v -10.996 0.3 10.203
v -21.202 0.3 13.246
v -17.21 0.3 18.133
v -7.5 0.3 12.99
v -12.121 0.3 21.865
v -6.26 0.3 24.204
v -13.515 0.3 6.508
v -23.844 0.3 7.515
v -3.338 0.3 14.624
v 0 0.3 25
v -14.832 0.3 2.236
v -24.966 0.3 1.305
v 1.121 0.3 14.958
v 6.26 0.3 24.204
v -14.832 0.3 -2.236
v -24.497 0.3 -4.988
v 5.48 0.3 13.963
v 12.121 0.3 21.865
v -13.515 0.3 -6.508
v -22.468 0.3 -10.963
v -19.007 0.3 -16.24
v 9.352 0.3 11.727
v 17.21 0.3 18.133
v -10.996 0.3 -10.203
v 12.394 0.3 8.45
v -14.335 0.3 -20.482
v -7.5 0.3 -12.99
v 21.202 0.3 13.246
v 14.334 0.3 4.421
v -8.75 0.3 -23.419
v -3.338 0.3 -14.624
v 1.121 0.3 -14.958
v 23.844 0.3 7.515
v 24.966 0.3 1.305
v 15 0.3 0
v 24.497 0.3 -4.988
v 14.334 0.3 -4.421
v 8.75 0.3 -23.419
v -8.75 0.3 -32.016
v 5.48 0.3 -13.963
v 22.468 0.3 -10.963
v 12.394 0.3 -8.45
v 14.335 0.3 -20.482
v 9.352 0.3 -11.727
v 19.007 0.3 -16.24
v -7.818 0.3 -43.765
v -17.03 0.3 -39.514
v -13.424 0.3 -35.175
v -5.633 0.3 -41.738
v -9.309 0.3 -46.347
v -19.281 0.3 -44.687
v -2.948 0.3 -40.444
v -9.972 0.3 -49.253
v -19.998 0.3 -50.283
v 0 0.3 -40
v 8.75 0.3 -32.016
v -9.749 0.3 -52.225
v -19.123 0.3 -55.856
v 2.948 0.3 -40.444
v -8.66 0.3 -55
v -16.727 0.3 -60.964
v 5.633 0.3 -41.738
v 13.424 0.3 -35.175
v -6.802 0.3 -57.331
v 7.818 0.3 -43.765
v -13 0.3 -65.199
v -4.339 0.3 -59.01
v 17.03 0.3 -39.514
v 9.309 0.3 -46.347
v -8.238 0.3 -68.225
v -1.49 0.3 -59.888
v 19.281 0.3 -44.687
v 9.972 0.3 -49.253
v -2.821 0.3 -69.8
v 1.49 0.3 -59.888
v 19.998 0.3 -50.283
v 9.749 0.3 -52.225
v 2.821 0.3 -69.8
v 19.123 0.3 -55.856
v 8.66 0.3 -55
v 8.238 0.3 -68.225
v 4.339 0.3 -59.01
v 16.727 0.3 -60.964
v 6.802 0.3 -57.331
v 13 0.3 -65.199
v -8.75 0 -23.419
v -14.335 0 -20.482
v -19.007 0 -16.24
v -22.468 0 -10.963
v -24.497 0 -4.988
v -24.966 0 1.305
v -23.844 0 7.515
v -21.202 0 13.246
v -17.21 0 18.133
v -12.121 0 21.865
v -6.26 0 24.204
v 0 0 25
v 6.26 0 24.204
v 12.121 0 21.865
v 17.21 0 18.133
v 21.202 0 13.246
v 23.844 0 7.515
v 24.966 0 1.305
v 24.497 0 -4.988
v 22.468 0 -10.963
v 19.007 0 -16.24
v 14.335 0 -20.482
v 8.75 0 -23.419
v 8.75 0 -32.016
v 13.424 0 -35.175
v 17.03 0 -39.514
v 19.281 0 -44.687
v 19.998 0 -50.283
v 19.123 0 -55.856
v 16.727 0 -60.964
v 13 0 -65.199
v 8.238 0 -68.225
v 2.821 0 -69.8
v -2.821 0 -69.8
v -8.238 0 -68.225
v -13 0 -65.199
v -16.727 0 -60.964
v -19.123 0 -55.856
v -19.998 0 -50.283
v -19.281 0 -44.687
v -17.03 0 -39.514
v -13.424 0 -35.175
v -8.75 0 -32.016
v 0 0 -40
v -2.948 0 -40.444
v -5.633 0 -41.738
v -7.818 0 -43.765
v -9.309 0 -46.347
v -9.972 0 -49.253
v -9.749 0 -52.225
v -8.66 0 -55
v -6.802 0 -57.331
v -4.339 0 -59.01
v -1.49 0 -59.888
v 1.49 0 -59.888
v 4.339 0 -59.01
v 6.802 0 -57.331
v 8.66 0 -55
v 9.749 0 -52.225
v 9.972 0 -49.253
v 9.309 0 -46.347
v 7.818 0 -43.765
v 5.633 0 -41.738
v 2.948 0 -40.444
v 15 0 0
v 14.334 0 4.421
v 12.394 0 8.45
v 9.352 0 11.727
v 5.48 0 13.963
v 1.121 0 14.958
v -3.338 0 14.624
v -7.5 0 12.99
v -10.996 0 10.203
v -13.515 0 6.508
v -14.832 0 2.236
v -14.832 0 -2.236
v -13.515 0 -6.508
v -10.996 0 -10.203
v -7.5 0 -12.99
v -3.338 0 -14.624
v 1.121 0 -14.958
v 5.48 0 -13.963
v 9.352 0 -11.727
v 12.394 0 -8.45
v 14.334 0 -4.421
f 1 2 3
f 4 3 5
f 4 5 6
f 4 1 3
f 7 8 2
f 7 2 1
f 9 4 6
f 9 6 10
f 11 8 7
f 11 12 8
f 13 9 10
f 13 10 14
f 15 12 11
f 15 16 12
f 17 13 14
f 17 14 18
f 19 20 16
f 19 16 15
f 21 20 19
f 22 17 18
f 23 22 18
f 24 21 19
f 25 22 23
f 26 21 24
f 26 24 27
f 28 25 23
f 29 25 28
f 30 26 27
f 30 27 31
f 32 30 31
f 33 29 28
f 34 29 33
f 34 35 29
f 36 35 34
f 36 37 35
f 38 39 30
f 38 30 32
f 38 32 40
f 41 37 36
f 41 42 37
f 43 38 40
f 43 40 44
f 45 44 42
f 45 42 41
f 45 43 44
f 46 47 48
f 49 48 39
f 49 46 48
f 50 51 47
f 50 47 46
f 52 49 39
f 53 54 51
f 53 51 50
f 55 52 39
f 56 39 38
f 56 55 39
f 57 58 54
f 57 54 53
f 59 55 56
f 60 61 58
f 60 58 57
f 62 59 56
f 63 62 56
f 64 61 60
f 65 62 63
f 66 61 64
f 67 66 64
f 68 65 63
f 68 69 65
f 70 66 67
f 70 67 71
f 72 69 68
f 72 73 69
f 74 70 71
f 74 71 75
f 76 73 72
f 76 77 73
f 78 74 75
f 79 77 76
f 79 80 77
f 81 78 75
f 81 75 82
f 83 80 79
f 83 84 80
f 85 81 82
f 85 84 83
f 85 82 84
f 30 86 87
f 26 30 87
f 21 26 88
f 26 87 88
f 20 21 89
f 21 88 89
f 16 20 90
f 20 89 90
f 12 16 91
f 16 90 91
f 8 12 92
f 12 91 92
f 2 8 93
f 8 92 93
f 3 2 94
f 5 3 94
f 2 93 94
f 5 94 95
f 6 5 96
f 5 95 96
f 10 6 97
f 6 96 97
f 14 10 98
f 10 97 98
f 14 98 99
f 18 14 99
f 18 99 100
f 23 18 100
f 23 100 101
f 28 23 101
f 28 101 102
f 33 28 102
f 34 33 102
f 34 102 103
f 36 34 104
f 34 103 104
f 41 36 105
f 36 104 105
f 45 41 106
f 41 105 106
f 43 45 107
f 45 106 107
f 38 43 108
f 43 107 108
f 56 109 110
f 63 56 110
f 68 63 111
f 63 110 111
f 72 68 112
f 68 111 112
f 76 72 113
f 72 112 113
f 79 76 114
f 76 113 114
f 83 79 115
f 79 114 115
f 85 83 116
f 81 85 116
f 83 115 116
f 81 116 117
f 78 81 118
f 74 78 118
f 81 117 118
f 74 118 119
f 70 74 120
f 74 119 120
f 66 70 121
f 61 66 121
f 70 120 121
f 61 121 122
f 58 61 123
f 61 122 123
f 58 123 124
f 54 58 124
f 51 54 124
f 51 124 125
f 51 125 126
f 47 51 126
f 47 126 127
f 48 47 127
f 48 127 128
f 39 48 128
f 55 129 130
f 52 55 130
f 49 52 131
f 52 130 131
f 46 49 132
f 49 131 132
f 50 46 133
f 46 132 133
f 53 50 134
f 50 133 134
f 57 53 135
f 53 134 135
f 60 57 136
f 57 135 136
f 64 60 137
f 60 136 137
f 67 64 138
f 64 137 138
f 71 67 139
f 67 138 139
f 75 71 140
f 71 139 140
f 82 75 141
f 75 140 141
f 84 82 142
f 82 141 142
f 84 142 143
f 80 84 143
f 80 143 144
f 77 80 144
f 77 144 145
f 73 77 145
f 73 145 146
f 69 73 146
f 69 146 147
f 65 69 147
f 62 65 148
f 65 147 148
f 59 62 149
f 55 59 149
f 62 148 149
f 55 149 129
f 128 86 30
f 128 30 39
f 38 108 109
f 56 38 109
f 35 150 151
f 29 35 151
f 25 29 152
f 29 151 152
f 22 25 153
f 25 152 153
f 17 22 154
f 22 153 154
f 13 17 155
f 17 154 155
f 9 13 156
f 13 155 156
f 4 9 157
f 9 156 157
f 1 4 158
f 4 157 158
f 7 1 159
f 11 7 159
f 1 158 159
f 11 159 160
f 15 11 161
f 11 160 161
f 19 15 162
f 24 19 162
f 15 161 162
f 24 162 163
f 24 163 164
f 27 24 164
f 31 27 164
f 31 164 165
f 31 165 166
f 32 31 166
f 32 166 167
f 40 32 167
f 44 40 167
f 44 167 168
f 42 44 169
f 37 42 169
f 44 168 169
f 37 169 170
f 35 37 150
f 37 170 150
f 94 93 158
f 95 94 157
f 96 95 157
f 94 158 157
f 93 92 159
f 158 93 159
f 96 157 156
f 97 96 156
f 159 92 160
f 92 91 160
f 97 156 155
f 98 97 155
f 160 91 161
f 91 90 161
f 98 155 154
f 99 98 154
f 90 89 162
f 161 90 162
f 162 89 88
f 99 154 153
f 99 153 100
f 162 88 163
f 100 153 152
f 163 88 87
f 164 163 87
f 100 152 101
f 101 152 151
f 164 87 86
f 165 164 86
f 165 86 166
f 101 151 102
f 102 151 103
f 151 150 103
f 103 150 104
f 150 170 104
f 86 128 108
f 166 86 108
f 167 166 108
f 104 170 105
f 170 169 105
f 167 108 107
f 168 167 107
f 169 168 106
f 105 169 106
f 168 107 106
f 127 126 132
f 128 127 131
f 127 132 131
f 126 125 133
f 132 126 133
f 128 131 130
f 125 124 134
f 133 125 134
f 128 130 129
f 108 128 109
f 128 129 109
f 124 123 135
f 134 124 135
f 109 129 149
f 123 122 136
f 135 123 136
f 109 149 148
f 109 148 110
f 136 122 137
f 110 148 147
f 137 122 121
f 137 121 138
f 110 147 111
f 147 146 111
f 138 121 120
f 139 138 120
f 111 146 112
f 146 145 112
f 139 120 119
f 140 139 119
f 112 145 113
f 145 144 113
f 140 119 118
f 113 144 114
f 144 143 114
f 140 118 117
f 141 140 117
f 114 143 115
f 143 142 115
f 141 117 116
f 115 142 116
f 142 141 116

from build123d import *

# Parameters (mm, degrees)
SKETCH1_R           = 20
SKETCH1_R_2         = 10
SKETCH1_R_3         = 25
SKETCH1_R_4         = 15
SKETCH1_W           = 17.5
SKETCH1_H           = 25
BOSS_EXTRUDE1_DEPTH = 0.3


with BuildPart() as part:
    # Sketch1 → Boss-Extrude1 (new body)
    with BuildSketch(Plane(origin=(0, 0, 0), x_dir=(1, 0, 0), z_dir=(0, 1, 0))):
        with Locations((0, 50)):
            Circle(SKETCH1_R)
        with Locations((0, 50)):
            Circle(SKETCH1_R_2, mode=Mode.SUBTRACT)
        Circle(SKETCH1_R_3)
        Circle(SKETCH1_R_4, mode=Mode.SUBTRACT)
        with Locations((0, 27.5)):
            Rectangle(SKETCH1_W, SKETCH1_H)
    extrude(amount=BOSS_EXTRUDE1_DEPTH)


solid = part.part
